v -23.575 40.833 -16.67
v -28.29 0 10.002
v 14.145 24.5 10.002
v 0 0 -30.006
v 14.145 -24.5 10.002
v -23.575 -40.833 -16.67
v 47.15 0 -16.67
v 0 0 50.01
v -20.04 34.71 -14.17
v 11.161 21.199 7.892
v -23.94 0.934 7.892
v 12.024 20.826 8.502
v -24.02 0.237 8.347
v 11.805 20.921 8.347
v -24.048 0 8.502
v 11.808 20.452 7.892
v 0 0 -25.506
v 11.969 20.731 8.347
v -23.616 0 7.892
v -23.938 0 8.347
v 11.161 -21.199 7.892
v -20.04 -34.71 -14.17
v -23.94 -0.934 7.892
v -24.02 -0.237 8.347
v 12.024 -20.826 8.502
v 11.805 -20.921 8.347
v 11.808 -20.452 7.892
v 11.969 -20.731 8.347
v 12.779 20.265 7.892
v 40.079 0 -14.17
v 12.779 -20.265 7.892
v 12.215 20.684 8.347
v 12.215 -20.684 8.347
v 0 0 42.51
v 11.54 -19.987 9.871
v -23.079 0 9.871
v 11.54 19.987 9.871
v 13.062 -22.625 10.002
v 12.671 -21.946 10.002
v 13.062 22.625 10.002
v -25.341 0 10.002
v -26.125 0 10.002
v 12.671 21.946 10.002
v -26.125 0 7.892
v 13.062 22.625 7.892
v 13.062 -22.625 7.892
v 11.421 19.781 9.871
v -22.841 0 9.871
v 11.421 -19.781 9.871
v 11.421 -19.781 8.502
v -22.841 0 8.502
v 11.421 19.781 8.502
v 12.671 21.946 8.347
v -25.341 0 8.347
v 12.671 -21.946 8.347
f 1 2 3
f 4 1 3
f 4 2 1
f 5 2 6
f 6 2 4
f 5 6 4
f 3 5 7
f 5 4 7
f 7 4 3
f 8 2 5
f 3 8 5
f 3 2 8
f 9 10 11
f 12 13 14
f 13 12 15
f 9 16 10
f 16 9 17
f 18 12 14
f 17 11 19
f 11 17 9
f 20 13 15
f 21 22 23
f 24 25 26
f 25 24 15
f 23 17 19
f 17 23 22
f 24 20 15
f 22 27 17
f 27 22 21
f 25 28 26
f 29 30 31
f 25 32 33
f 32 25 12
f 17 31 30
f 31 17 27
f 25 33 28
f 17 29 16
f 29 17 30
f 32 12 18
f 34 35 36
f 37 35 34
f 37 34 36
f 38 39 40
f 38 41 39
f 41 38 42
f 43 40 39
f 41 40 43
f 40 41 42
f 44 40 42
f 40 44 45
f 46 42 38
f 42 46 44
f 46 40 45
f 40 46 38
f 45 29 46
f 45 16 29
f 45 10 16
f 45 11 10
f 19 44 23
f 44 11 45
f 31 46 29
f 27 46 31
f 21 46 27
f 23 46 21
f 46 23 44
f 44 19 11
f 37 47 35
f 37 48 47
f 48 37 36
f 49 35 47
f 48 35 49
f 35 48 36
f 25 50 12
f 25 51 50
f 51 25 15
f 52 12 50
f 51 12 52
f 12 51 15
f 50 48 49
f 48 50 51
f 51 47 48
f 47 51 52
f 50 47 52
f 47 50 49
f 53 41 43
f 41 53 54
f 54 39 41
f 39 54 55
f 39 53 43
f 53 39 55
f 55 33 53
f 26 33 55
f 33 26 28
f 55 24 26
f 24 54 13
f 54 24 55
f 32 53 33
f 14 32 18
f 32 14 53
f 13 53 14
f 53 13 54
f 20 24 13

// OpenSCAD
arete = 49;
paroi = 1.5;
echelleReductionAjustementBouchon = 0.97;
r = 0.19; // résolution d'impression sur l'axe Z
tetra_sch = [3,3];
Cpi = 3.14159;
Cphi = (1+sqrt(5))/2;
Cepsilon = 0.00000001;

function tetra_ext_radius(a) = 
    a/4*sqrt(6);
    
function tetra_int_radius(a) = 
    a/12*sqrt(6);
    
function tetra_arete_from_int(radius) = 
    radius*12/sqrt(6);
    
function tetra_arete_from_ext(radius) = 
    radius*4/sqrt(6);
    
externalRadius = tetra_ext_radius(arete);
internalRadius = tetra_ext_radius( 
                    tetra_arete_from_int(
                        tetra_int_radius(arete)-paroi));
                        
echo(externalRadius); 
echo(internalRadius);

render(convexity = 2)
//merkaba(arete);
//poly_creux();
//decoupe_bouchon();
corps_ouvert();
bouchon();
//trou();

module corps_ouvert() {
//    rotate([180, 0, 0])
	difference() {
		poly_creux();
		decoupe_bouchon();
	}
}

module bouchon() {
//	scale([echelleReductionAjustementBouchon, echelleReductionAjustementBouchon, 0.995])
	difference () {
        intersection() {
            union() {
                poly_creux();
                supplement_feuillure_bouchon(echelleReductionAjustementBouchon);
            }
            decoupe_bouchon(echelleReductionAjustementBouchon);
        }
	}
}

module poly_creux() {
	difference() {
        stellated_tetrahedron(externalRadius);
        stellated_tetrahedron(internalRadius);
	}
}

module decoupe_bouchon(scale=1) {
    distance = tetra_int_radius(arete);
    scale2 = pow(scale,4);
    prof_ratio = 1.4*scale2;
	rotate([0,0,60]) translate([0,0,distance+0.0])
		cylinder(999, r=arete*0.6, $fn=3);
	rotate([0,0,60]) translate([0,0,distance-(prof_ratio*paroi+0.01)*scale2])
		cylinder((prof_ratio*paroi+0.01)*scale2, r=(arete-paroi)*0.55*scale, $fn=3, center=false);
}

module supplement_feuillure_bouchon(scale=1) {
    distance = tetra_int_radius(arete);
    radius = (arete-paroi)*scale*0.55;
    rotate([0,0,60]) translate([0,0, distance-paroi])
    difference() {   
		cylinder(paroi*pow(scale,3), r=radius, $fn=3, center=false);
		cylinder(paroi*pow(scale,3), r=radius-2.5, $fn=3, center=false);
    }
}

module stellated_tetrahedron(rad) {
    distance = 2*tetra_int_radius(tetra_arete_from_ext(rad));
    union() {
        tetrahedron(rad);
        translate([0, 0, distance]) rotate([0,180,60]) tetrahedron(rad);
        for (i = [1:3]) {
            rotate([0,-acos(1/3),360/3*i]) translate([0, 0, -distance]) tetrahedron(rad);
        }
    }
}

module tetrahedron(rad) {
    // create an instance of a spherical coordinate
    // long - rotation around z -axis
    // lat - latitude, starting at 0 == 'north pole'
    // rad - distance from center
    function sph(long, lat, rad=1) = [long, lat, rad];
    
    // Convert spherical to cartesian
    function sph_to_cart(s) = [
	clean(s[2]*sin(s[1])*cos(s[0])),  

	clean(s[2]*sin(s[1])*sin(s[0])),

	clean(s[2]*cos(s[1]))
	];

    function sphu_from_cart(c, rad=1) = sph(
        atan2(c[1],c[0]), 
        atan2(sqrt(c[0]*c[0]+c[1]*c[1]), c[2]), 
        rad
        );

    tetra_cart = [
        [+1, +1, +1],
        [-1, -1, +1],
        [-1, +1, -1],
        [+1, -1, -1]
    ];

    function tetra_unit(rad=1) = [
        sph_to_cart(sphu_from_cart(tetra_cart[0], rad)), 
        sph_to_cart(sphu_from_cart(tetra_cart[1], rad)),
        sph_to_cart(sphu_from_cart(tetra_cart[2], rad)),
        sph_to_cart(sphu_from_cart(tetra_cart[3], rad)),
        ];


    tetrafaces = [
        [0, 3, 1],
        [0,1,2],
        [2,1,3],
        [0,2,3]
    ];

    tetra_edges = [
        [0,1],
        [0,2],
        [0,3], 
        [1,2], 
        [1,3], 
        [2,3],	
        ];

    rotate([0, (180-acos(1/3))/2, 0])
    rotate([0, 0, 45])
//    rotate(a=(180-acos(1/3))/2, v=[1,1,0])
    polyhedron(tetra_unit(rad), faces=tetrafaces);
}
//translate([0, 0, -17.7])
//cylinder(5,40,40);

function clean(n) = (n < 0) ? ((n < -Cepsilon) ? n : 0) : 
	(n < Cepsilon) ? 0 : n; 

function plat_dihedral(pq) = 2 * asin( cos(180/pq[1])/sin(180/pq[0]));

function plat_circumradius(pq, a) = 
	(a/2)*
	tan(Cpi/pq[1])*
	tan(plat_dihedral(pq)/2);

function plat_midradius(pq, a) = 
	(a/2)*
	cos(Cpi/pq[0])*
	tan(plat_dihedral(pq)/2);

function plat_inradius(pq,a) = 
	a/(2*tan(Cpi/pq[0]))*
	sqrt((1-cos(plat_dihedral(pq)))/(1+cos(plat_dihedral(pq))));

function plat_a_from_inradius(pq, inradius) =
    inradius*(2*tan(Cpi/pq[0]))/
	sqrt((1-cos(plat_dihedral(pq)))/(1+cos(plat_dihedral(pq))));
